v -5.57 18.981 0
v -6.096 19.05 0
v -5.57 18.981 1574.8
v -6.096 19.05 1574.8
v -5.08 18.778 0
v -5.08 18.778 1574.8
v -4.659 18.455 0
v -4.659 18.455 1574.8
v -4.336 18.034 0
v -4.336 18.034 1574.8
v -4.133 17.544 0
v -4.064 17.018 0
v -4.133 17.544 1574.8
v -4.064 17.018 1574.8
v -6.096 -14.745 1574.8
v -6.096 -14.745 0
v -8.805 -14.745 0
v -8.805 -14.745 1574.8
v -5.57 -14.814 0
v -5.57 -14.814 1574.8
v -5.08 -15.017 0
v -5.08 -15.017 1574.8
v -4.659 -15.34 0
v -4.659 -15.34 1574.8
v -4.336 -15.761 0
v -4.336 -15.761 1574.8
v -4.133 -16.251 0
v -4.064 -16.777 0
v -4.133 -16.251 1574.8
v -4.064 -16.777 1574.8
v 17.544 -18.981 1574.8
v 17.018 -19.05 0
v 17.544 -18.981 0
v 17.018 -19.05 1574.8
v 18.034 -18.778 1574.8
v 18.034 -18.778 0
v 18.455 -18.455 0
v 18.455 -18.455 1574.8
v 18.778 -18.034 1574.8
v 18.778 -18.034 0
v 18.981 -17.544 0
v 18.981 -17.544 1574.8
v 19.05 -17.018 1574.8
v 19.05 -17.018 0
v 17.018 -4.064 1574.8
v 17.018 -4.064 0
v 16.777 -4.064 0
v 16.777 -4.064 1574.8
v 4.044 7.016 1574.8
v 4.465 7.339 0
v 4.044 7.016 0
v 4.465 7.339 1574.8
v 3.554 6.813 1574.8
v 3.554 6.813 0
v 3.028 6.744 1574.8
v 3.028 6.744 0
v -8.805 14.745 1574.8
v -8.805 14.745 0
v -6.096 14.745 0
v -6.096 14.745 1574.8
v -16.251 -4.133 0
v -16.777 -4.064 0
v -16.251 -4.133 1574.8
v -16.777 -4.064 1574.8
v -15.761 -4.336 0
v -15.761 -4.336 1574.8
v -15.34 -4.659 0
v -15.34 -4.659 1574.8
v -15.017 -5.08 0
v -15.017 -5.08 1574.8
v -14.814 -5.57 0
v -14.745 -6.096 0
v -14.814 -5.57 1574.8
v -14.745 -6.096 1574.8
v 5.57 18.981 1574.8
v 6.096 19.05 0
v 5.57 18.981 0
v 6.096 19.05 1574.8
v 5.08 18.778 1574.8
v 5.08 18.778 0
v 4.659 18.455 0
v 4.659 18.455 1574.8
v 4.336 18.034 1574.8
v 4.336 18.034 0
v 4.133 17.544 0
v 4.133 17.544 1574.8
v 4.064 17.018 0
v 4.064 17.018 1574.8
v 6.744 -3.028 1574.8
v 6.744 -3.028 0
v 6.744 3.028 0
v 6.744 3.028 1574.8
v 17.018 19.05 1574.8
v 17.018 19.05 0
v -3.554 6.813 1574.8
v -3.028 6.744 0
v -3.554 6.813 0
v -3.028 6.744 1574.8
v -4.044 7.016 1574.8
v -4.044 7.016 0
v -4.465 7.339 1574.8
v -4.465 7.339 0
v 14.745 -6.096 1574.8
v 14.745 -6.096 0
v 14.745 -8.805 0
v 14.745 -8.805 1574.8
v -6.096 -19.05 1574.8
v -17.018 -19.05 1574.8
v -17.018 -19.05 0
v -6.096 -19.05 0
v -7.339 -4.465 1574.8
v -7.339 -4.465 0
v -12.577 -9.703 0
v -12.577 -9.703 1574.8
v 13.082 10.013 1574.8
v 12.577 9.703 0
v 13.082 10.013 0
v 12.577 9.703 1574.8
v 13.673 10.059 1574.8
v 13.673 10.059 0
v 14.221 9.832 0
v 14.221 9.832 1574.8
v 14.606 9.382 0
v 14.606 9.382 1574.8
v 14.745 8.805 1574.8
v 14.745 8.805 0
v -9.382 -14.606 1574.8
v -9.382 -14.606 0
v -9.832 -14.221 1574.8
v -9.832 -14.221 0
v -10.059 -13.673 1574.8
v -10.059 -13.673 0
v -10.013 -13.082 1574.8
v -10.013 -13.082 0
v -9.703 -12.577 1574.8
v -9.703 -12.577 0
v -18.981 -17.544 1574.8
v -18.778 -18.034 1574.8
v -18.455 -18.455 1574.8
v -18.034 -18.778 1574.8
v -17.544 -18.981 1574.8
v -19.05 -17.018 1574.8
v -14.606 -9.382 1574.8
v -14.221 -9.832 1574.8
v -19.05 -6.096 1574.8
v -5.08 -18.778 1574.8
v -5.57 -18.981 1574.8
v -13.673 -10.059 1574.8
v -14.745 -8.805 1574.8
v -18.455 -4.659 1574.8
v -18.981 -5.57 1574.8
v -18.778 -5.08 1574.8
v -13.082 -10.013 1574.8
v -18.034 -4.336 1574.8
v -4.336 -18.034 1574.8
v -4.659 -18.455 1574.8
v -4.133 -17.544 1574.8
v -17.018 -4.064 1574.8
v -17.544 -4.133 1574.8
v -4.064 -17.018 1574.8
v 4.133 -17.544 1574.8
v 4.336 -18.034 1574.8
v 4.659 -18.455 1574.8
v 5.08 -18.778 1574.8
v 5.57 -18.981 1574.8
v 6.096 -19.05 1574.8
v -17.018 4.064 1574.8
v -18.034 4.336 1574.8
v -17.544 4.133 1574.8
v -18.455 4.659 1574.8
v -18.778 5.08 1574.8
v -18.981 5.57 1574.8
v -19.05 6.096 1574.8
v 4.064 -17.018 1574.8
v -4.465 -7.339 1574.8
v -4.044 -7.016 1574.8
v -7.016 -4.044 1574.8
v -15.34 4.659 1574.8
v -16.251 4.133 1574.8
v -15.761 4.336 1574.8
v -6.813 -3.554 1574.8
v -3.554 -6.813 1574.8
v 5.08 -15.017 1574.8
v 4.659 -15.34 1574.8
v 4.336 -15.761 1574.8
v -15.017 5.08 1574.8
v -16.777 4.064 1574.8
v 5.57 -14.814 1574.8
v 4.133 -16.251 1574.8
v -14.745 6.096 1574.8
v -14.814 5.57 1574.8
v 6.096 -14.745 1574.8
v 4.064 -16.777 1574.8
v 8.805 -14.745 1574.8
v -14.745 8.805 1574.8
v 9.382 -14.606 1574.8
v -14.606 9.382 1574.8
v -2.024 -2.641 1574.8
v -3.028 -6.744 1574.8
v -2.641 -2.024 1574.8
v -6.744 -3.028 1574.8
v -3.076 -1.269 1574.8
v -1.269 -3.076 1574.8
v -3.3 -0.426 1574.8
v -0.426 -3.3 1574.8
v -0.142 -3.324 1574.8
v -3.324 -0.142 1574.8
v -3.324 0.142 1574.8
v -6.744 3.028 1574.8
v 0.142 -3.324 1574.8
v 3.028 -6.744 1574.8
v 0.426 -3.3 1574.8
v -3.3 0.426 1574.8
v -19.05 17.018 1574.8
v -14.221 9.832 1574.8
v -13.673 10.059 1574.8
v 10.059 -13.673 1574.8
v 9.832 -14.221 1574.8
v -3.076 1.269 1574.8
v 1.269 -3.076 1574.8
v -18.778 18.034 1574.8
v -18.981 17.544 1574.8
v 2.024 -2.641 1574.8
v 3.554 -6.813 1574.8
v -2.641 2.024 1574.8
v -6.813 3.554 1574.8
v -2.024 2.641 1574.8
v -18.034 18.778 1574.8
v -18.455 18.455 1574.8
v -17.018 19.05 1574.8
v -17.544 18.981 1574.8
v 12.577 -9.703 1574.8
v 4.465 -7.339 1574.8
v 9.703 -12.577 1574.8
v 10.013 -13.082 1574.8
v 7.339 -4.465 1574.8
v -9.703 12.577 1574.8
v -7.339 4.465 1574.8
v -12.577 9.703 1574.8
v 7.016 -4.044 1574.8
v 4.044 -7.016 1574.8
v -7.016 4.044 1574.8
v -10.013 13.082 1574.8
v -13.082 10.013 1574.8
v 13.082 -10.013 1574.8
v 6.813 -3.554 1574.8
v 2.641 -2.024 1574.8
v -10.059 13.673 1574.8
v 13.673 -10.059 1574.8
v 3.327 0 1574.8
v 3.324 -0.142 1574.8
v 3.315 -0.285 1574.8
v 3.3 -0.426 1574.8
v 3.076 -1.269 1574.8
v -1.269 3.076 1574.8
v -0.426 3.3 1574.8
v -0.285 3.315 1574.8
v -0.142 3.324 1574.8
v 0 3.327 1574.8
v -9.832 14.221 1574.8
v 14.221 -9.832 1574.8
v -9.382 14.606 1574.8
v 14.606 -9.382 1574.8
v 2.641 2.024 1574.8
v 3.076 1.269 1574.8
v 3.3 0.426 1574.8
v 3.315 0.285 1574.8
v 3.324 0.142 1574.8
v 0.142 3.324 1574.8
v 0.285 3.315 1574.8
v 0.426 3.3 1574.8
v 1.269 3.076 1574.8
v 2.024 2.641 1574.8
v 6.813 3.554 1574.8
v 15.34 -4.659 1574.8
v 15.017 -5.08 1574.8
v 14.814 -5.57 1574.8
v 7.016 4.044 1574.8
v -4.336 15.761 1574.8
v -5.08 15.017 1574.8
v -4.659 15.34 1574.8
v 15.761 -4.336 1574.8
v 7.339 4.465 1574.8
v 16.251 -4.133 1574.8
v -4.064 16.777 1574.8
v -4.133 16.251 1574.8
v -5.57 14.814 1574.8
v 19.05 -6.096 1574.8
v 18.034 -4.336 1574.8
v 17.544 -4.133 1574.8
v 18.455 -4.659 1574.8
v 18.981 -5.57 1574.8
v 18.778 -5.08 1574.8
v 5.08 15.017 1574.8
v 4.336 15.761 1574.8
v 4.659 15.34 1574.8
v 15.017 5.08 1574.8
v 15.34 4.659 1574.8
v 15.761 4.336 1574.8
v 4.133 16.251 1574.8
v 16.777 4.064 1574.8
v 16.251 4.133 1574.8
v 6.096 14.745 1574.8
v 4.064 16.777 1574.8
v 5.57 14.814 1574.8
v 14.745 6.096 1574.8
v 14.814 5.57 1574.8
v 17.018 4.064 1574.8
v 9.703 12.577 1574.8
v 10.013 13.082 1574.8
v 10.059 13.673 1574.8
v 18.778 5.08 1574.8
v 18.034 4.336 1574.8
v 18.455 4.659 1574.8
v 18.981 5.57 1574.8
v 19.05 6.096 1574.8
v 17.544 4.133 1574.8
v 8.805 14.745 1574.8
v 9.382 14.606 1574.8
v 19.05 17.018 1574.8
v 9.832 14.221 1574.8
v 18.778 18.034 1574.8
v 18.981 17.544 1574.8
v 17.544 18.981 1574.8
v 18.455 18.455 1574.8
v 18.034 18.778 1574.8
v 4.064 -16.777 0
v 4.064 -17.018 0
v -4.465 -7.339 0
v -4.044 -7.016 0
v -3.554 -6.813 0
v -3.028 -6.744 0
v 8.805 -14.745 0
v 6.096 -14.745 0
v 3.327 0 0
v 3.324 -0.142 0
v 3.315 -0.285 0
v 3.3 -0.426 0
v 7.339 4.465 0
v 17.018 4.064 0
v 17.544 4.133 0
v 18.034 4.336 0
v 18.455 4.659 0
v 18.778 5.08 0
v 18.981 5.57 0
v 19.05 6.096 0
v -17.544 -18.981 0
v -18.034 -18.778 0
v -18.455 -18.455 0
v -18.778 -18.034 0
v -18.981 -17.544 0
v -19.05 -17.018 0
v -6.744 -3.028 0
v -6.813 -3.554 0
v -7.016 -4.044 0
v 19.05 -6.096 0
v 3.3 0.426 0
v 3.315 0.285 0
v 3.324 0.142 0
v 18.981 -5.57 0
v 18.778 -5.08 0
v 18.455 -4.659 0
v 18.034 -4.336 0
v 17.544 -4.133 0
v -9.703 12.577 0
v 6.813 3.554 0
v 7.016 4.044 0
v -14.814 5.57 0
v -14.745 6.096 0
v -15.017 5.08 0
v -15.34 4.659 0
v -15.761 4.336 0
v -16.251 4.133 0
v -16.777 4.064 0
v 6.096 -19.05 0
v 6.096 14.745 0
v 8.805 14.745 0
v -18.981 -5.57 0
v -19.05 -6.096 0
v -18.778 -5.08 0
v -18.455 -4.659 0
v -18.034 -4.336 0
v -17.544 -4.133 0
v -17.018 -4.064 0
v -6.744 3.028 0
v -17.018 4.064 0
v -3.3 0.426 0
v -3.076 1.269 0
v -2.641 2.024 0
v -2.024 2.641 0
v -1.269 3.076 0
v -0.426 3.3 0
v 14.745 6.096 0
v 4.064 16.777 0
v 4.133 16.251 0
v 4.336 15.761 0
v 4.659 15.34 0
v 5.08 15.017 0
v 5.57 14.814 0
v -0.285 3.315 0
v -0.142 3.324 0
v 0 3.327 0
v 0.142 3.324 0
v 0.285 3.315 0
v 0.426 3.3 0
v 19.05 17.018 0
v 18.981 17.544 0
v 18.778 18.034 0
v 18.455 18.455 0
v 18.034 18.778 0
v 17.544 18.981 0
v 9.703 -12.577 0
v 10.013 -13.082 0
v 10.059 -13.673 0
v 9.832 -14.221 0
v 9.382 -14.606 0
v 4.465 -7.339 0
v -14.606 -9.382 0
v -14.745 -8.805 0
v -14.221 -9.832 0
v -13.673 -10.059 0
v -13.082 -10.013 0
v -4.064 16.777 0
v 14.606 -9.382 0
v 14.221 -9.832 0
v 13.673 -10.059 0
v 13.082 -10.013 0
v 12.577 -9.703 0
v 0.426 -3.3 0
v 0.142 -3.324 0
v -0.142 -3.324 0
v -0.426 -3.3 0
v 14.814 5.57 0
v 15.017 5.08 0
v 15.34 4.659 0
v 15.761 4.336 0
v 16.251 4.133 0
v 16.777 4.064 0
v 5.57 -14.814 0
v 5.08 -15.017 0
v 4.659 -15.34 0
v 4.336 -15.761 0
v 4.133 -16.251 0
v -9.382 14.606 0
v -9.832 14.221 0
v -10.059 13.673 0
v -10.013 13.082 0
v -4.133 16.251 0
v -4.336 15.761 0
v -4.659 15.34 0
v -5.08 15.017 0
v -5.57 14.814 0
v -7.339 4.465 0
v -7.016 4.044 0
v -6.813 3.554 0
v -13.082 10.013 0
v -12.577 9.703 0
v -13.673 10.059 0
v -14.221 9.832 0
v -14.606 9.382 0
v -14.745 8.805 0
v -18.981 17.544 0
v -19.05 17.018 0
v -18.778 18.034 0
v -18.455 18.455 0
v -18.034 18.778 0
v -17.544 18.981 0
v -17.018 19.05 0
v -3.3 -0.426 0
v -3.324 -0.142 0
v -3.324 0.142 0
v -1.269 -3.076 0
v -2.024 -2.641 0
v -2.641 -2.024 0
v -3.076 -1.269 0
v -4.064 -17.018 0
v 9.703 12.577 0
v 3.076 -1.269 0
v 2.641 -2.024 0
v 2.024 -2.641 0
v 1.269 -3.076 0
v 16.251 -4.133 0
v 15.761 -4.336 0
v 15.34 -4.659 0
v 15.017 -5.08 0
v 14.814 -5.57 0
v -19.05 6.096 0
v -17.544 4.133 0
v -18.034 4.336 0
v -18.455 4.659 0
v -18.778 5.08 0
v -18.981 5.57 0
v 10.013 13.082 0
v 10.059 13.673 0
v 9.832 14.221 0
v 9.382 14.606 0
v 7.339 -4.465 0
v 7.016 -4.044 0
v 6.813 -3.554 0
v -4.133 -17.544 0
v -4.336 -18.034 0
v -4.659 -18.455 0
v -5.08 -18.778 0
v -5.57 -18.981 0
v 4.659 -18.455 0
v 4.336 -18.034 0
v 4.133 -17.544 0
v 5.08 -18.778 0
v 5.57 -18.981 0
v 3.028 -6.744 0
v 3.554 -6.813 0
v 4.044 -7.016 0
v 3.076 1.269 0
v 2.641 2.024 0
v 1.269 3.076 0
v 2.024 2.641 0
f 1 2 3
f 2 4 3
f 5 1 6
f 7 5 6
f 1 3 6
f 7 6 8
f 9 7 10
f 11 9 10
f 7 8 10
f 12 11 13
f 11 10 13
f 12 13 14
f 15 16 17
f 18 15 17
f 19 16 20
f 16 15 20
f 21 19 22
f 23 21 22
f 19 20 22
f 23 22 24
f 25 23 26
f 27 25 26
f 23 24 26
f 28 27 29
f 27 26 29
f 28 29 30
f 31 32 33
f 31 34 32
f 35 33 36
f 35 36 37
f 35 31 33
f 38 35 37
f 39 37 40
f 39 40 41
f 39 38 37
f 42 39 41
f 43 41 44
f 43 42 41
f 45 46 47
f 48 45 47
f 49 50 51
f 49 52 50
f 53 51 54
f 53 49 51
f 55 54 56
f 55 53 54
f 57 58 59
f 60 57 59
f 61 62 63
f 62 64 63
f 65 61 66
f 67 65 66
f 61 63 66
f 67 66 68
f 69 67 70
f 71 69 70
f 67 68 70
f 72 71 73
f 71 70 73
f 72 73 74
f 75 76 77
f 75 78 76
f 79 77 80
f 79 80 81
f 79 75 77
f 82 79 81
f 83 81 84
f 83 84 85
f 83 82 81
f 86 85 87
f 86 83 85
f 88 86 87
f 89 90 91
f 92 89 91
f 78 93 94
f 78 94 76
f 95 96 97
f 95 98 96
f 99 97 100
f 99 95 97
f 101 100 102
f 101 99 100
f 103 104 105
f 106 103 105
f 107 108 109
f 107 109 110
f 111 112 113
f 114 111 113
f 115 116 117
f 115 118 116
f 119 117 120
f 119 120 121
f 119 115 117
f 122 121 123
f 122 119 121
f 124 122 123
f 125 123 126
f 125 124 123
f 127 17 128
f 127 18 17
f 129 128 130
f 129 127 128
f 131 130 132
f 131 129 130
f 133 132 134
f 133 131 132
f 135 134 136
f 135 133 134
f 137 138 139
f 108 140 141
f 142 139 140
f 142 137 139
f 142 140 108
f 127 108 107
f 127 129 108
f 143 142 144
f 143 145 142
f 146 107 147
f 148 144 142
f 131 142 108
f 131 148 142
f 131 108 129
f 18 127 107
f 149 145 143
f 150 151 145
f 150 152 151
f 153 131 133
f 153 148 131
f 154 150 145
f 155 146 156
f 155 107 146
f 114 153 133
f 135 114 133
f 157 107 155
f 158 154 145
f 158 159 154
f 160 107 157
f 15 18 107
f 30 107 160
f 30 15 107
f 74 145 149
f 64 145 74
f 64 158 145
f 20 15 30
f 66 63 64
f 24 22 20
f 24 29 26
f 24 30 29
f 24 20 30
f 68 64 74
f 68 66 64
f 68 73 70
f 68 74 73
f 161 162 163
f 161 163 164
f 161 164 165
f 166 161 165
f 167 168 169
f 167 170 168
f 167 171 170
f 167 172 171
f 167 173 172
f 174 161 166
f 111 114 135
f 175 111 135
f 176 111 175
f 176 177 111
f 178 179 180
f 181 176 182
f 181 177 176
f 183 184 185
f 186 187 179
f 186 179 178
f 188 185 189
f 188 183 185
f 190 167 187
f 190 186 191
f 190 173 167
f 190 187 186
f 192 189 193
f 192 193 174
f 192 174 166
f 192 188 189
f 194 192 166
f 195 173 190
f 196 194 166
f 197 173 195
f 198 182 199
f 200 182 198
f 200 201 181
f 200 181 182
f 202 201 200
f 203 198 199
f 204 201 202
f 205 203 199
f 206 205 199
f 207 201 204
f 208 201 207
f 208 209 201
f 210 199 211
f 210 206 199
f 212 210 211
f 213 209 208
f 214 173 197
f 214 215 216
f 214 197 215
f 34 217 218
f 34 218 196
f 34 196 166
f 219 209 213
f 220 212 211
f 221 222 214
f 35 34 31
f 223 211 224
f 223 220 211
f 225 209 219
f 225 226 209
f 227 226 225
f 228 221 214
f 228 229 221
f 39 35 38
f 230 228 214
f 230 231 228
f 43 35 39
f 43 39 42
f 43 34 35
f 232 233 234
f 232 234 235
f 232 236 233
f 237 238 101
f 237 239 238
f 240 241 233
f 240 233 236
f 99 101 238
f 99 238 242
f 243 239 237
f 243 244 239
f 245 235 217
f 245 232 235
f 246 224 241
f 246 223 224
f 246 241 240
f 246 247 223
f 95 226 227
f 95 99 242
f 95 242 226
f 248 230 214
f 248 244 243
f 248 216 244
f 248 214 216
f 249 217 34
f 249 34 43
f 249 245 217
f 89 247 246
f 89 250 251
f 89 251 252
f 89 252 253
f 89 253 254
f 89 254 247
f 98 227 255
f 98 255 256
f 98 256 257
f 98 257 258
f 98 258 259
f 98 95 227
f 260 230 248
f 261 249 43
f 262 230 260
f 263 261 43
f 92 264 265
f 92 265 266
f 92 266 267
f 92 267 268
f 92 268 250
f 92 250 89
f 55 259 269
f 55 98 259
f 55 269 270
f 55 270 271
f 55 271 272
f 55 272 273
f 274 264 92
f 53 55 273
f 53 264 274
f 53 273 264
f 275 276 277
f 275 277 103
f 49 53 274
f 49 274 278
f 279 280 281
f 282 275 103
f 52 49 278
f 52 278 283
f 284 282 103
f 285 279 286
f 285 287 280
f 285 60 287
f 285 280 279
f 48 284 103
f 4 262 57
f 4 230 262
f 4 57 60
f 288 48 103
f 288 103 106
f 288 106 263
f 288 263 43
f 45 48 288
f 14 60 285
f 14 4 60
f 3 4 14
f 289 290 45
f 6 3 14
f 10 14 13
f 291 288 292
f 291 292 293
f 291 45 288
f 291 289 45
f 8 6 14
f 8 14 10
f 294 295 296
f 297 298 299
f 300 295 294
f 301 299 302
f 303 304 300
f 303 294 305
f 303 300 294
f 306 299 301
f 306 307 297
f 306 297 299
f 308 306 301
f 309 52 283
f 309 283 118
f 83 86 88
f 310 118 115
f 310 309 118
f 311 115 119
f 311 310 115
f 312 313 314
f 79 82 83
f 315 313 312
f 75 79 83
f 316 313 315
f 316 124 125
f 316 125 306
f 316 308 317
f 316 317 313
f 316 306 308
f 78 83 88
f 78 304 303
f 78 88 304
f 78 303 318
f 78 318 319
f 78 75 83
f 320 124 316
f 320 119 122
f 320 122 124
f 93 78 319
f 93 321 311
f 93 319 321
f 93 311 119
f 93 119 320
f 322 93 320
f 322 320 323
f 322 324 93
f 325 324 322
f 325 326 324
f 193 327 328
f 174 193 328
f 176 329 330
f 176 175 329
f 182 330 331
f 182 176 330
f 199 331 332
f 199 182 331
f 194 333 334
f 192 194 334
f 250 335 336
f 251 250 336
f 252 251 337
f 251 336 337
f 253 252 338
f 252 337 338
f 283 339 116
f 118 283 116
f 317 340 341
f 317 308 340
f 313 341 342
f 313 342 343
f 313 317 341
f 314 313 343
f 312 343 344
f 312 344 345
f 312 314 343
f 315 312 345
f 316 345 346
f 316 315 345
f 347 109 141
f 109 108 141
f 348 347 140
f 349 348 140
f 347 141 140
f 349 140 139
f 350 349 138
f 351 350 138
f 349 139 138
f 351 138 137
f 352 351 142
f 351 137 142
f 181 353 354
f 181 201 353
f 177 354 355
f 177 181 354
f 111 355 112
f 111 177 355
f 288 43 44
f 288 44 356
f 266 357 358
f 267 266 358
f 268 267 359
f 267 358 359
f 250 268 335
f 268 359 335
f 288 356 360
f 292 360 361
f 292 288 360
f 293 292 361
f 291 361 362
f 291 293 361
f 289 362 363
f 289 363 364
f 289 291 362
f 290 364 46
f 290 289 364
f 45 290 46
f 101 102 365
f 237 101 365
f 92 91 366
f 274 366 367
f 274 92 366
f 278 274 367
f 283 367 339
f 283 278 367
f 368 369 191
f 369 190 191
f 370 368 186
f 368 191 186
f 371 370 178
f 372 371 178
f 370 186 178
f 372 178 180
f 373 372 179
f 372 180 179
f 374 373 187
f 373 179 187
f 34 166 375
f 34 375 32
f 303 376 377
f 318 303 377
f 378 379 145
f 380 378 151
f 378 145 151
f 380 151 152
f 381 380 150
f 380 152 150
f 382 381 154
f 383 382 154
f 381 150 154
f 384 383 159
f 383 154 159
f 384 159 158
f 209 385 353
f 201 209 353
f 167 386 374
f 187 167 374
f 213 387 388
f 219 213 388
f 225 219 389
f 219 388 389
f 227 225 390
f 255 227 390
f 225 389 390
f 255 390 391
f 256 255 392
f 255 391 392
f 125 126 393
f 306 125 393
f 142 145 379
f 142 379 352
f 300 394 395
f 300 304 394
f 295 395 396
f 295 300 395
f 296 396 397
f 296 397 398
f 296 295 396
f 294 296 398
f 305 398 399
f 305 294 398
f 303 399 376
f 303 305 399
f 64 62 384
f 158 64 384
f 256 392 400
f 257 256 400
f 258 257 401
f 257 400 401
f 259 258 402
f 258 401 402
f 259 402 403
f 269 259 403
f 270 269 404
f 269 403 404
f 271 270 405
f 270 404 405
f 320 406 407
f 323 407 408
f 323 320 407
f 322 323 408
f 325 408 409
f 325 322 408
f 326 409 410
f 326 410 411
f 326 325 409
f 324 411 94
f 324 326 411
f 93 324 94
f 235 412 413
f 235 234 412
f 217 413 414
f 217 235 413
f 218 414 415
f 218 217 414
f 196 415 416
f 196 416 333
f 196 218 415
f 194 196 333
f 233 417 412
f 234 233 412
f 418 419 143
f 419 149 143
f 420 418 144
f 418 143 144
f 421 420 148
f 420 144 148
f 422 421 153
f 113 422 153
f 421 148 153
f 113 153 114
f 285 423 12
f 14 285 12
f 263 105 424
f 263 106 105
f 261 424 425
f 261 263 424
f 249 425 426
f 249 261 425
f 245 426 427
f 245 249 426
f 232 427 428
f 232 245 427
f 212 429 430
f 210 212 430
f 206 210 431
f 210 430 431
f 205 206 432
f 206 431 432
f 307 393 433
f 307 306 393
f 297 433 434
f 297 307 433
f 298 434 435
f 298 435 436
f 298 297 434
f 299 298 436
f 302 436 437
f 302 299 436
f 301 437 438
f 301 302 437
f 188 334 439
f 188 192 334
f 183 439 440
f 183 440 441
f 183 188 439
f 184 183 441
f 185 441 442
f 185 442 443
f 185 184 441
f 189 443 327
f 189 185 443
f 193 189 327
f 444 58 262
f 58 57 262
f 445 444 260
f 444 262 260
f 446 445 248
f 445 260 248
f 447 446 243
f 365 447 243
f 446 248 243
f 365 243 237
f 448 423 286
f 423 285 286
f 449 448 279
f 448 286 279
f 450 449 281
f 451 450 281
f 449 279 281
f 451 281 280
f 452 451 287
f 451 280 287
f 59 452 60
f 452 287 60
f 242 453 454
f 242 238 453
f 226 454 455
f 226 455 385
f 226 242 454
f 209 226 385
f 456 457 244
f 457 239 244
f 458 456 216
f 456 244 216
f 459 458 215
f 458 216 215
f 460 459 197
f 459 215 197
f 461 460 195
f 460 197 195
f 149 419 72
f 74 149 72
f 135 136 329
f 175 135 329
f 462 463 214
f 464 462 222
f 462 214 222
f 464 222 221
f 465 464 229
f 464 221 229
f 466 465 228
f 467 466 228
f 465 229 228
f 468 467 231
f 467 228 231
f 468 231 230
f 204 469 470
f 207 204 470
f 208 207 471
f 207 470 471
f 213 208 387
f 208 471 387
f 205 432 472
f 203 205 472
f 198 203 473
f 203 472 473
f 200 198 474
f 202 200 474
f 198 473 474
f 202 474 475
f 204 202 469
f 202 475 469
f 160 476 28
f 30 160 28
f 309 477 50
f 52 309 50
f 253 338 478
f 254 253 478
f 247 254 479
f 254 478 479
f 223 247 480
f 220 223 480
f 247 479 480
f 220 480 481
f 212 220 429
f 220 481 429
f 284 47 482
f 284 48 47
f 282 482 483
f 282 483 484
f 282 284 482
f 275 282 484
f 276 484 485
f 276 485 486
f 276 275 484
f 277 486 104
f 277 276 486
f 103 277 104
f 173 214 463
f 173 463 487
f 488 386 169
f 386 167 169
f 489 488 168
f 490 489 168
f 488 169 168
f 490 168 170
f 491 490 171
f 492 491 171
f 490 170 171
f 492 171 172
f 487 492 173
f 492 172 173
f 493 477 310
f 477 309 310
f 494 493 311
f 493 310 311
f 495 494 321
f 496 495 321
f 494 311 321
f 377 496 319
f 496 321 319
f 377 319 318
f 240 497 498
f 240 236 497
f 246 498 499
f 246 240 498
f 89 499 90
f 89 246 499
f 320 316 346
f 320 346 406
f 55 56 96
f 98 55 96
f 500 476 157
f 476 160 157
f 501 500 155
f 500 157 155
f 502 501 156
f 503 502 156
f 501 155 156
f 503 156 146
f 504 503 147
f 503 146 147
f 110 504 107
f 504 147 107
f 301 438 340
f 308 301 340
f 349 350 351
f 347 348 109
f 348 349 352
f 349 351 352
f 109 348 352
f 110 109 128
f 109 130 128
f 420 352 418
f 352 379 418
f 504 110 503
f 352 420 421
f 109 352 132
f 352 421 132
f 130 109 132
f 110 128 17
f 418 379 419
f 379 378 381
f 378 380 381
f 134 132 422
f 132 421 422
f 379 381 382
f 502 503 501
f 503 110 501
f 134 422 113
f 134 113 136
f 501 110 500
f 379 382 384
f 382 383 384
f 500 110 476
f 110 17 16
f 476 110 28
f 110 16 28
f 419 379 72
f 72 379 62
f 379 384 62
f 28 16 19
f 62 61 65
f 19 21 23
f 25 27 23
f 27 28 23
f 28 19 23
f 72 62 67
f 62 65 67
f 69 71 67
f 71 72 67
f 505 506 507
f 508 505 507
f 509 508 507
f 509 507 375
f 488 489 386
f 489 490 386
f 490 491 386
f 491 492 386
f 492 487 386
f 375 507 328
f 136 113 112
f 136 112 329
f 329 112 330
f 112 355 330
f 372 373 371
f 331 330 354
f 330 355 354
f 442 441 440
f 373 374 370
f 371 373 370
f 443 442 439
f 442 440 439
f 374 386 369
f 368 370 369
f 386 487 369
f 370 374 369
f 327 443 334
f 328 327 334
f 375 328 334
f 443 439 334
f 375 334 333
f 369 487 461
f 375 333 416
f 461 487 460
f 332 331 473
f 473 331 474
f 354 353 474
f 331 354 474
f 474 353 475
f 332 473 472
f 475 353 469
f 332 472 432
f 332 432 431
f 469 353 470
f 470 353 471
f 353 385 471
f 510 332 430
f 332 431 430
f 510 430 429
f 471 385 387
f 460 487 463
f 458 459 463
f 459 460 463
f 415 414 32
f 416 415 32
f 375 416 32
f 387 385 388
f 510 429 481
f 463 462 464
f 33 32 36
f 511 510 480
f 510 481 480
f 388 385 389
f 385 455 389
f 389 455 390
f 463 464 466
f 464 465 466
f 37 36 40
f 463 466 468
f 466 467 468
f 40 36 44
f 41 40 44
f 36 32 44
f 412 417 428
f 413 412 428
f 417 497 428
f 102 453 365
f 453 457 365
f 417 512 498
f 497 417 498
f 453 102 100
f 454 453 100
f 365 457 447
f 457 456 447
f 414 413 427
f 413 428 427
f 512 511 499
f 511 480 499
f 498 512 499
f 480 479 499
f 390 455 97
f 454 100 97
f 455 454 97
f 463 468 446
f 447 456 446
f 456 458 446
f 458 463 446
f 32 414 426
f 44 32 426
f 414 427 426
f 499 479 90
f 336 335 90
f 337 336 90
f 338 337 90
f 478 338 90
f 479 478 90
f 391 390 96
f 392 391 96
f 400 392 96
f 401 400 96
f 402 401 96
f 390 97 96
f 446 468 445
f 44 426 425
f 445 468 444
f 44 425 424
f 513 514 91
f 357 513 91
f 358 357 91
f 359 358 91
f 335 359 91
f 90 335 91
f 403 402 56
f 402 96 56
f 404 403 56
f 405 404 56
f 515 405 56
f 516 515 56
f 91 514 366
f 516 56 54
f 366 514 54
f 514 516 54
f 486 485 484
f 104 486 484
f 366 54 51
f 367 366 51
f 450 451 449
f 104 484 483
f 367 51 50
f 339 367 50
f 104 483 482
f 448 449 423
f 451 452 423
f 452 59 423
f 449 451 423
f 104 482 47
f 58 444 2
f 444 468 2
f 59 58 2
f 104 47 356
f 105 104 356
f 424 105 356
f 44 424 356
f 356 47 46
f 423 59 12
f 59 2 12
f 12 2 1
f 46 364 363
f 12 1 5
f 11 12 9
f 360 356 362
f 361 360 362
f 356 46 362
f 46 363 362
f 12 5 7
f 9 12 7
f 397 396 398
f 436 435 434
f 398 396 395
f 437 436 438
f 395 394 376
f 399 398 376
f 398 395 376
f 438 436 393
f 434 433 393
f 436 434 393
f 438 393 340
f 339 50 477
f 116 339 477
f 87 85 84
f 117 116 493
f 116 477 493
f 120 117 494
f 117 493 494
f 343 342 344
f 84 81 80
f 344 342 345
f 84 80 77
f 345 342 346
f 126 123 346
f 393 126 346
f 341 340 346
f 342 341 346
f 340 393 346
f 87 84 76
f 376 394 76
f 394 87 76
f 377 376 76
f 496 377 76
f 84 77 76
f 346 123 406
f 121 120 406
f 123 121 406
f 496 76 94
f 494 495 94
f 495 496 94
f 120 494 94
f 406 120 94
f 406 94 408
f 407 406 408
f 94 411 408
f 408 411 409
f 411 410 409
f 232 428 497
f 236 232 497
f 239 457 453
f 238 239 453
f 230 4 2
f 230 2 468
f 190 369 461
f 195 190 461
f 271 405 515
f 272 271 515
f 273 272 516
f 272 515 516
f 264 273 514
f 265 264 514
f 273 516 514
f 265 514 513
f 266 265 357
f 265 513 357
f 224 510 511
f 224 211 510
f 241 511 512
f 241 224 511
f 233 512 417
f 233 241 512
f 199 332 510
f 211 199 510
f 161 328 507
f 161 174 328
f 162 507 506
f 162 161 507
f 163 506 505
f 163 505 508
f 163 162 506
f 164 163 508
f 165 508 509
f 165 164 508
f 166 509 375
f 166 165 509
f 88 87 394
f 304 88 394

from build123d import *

# Parameters (mm, degrees)
SKETCH1_W           = 2.6797
SKETCH1_H           = 2.6797
BOSS_EXTRUDE1_DEPTH = 1574.8
FILLET2_R           = 2.032
FILLET3_R           = 2.032
FILLET4_R           = 1.27


with BuildPart() as part:
    # Sketch1 → Boss-Extrude1 (new body)
    with BuildSketch(Plane.XY):
        Polygon((-19.05, 16.176318041), (-19.05, 14.7447), (-17.618381959, 14.7447), align=None)
        Polygon((-14.7447, 17.618381959), (-14.7447, 19.05), (-16.176318041, 19.05), align=None)
        Polygon((14.7447, 19.05), (14.7447, 17.618381959), (16.176318041, 19.05), align=None)
        Polygon((17.618381959, 14.7447), (19.05, 14.7447), (19.05, 16.176318041), align=None)
        Polygon((19.05, -14.7447), (17.618381959, -14.7447), (19.05, -16.176318041), align=None)
        Polygon((16.176318041, -19.05), (14.7447, -17.618381959), (14.7447, -19.05), align=None)
        Polygon((19.05, -16.176318041), (17.618381959, -14.7447), (14.7447, -14.7447), (14.7447, -17.618381959), (16.176318041, -19.05), (19.05, -19.05), align=None)
        Polygon((19.05, -4.064), (14.7447, -4.064), (14.7447, -11.871018041), (17.618381959, -14.7447), (19.05, -14.7447), align=None)
        Polygon((17.618381959, -14.7447), (14.7447, -11.871018041), (14.7447, -14.7447), align=None)
        Polygon((14.7447, -14.7447), (11.871018041, -14.7447), (14.7447, -17.618381959), align=None)
        Polygon((11.871018041, -14.7447), (4.064, -14.7447), (4.064, -19.05), (14.7447, -19.05), (14.7447, -17.618381959), align=None)
        Polygon((14.7447, 6.7437), (14.7447, 4.064), (19.05, 4.064), (19.05, 14.7447), (17.618381959, 14.7447), (14.7447, 11.871018041), align=None)
        Polygon((14.7447, 14.7447), (14.7447, 11.871018041), (17.618381959, 14.7447), align=None)
        Polygon((16.176318041, 19.05), (14.7447, 17.618381959), (14.7447, 14.7447), (17.618381959, 14.7447), (19.05, 16.176318041), (19.05, 19.05), align=None)
        Polygon((4.064, 19.05), (4.064, 14.7447), (11.871018041, 14.7447), (14.7447, 17.618381959), (14.7447, 19.05), align=None)
        Polygon((14.7447, 17.618381959), (11.871018041, 14.7447), (14.7447, 14.7447), align=None)
        Polygon((-6.7437, 14.7447), (-4.064, 14.7447), (-4.064, 19.05), (-14.7447, 19.05), (-14.7447, 17.618381959), (-11.871018041, 14.7447), align=None)
        Polygon((-14.7447, 14.7447), (-11.871018041, 14.7447), (-14.7447, 17.618381959), align=None)
        Polygon((-14.7447, 14.7447), (-14.7447, 17.618381959), (-16.176318041, 19.05), (-19.05, 19.05), (-19.05, 16.176318041), (-17.618381959, 14.7447), align=None)
        Polygon((-17.618381959, 14.7447), (-14.7447, 11.871018041), (-14.7447, 14.7447), align=None)
        Polygon((-19.05, 4.064), (-14.7447, 4.064), (-14.7447, 6.7437), (-14.7447, 11.871018041), (-17.618381959, 14.7447), (-19.05, 14.7447), align=None)
        Polygon((-14.7447, -11.871018041), (-14.7447, -4.064), (-19.05, -4.064), (-19.05, -14.7447), (-17.618381959, -14.7447), align=None)
        Polygon((-14.7447, -14.7447), (-14.7447, -11.871018041), (-17.618381959, -14.7447), align=None)
        Polygon((-19.05, -16.176318041), (-17.618381959, -14.7447), (-19.05, -14.7447), align=None)
        Polygon((-14.7447, -14.7447), (-17.618381959, -14.7447), (-19.05, -16.176318041), (-19.05, -19.05), (-16.176318041, -19.05), (-14.7447, -17.618381959), align=None)
        Polygon((-16.176318041, -19.05), (-14.7447, -19.05), (-14.7447, -17.618381959), align=None)
        Polygon((-14.7447, -17.618381959), (-11.871018041, -14.7447), (-14.7447, -14.7447), align=None)
        Polygon((-4.064, -19.05), (-4.064, -14.7447), (-6.7437, -14.7447), (-11.871018041, -14.7447), (-14.7447, -17.618381959), (-14.7447, -19.05), align=None)
        Polygon((-6.7437, -6.7437), (-6.7437, -4.064), (-6.937681959, -4.064), (-14.7447, -11.871018041), (-14.7447, -14.7447), (-11.871018041, -14.7447), (-6.7437, -9.617381959), align=None)
        Polygon((-4.064, -6.937681959), (-4.064, -6.7437), (-6.7437, -6.7437), (-6.7437, -9.617381959), align=None)
        with Locations((-5.40385, -5.40385)):
            Rectangle(SKETCH1_W, SKETCH1_H)
        Polygon((6.7437, -6.7437), (4.064, -6.7437), (4.064, -6.937681959), (11.871018041, -14.7447), (14.7447, -14.7447), (14.7447, -11.871018041), (6.937681959, -4.064), (6.7437, -4.064), align=None)
        Polygon((4.064, 6.937681959), (4.064, 6.7437), (6.7437, 6.7437), (9.617381959, 6.7437), (14.7447, 11.871018041), (14.7447, 14.7447), (11.871018041, 14.7447), align=None)
        Polygon((6.7437, 6.7437), (6.7437, 4.064), (6.937681959, 4.064), (9.617381959, 6.7437), align=None)
        Polygon((-9.617381959, 6.7437), (-6.7437, 6.7437), (-6.7437, 9.617381959), (-11.871018041, 14.7447), (-14.7447, 14.7447), (-14.7447, 11.871018041), align=None)
        Polygon((-6.7437, 6.7437), (-4.064, 6.7437), (-4.064, 6.937681959), (-6.7437, 9.617381959), align=None)
        Polygon((-6.937681959, 4.064), (-6.7437, 4.064), (-6.7437, 6.7437), (-9.617381959, 6.7437), align=None)
        with Locations((-5.40385, 5.40385)):
            Rectangle(SKETCH1_W, SKETCH1_H)
        Polygon((-6.7437, 3.870018041), (-4.064, 1.190318041), (-4.064, 4.064), (-6.7437, 4.064), align=None)
        Polygon((-4.064, -1.190318041), (-4.064, 1.190318041), (-6.7437, 3.870018041), (-6.7437, -3.870018041), align=None)
        with BuildLine():
            ThreePointArc((-3.299979026, 0.426297067), (-2.352827104, 2.352827104), (-0.426297067, 3.299979026))
            Line((-0.426297067, 3.299979026), (-1.190318041, 4.064))
            Line((-1.190318041, 4.064), (-4.064, 4.064))
            Line((-4.064, 4.064), (-4.064, 1.190318041))
            Line((-4.064, 1.190318041), (-3.299979026, 0.426297067))
        make_face()
        Polygon((-4.064, 4.064), (-1.190318041, 4.064), (-3.870018041, 6.7437), (-4.064, 6.7437), align=None)
        Polygon((-1.190318041, 4.064), (0, 4.064), (0, 6.7437), (-3.870018041, 6.7437), align=None)
        with BuildLine():
            ThreePointArc((-0.426297067, 3.299979026), (-0.213589032, 3.32053768), (0, 3.3274))
            Line((0, 3.3274), (0, 4.064))
            Line((0, 4.064), (-1.190318041, 4.064))
            Line((-1.190318041, 4.064), (-0.426297067, 3.299979026))
        make_face()
        with BuildLine():
            Line((0, 4.064), (0, 3.3274))
            ThreePointArc((0, 3.3274), (0.213589032, 3.32053768), (0.426297067, 3.299979026))
            Line((0.426297067, 3.299979026), (1.190318041, 4.064))
            Line((1.190318041, 4.064), (0, 4.064))
        make_face()
        Polygon((0, 6.7437), (0, 4.064), (1.190318041, 4.064), (3.870018041, 6.7437), align=None)
        Polygon((3.870018041, 6.7437), (1.190318041, 4.064), (4.064, 4.064), (4.064, 6.7437), align=None)
        with Locations((5.40385, 5.40385)):
            Rectangle(SKETCH1_W, SKETCH1_H)
        Polygon((4.064, 4.064), (4.064, 1.190318041), (6.7437, 3.870018041), (6.7437, 4.064), align=None)
        Polygon((4.064, 1.190318041), (4.064, 0), (6.7437, 0), (6.7437, 3.870018041), align=None)
        with BuildLine():
            ThreePointArc((0.426297067, 3.299979026), (2.352827104, 2.352827104), (3.299979026, 0.426297067))
            Line((3.299979026, 0.426297067), (4.064, 1.190318041))
            Line((4.064, 1.190318041), (4.064, 4.064))
            Line((4.064, 4.064), (1.190318041, 4.064))
            Line((1.190318041, 4.064), (0.426297067, 3.299979026))
        make_face()
        with BuildLine():
            ThreePointArc((3.299979026, 0.426297067), (3.32053768, 0.213589032), (3.3274, 0))
            Line((3.3274, 0), (4.064, 0))
            Line((4.064, 0), (4.064, 1.190318041))
            Line((4.064, 1.190318041), (3.299979026, 0.426297067))
        make_face()
        with BuildLine():
            Line((4.064, 0), (3.3274, 0))
            ThreePointArc((3.3274, 0), (3.32053768, -0.213589032), (3.299979026, -0.426297067))
            Line((3.299979026, -0.426297067), (4.064, -1.190318041))
            Line((4.064, -1.190318041), (4.064, 0))
        make_face()
        Polygon((6.7437, 0), (4.064, 0), (4.064, -1.190318041), (6.7437, -3.870018041), align=None)
        Polygon((6.7437, -3.870018041), (4.064, -1.190318041), (4.064, -4.064), (6.7437, -4.064), align=None)
        with BuildLine():
            Line((4.064, -1.190318041), (3.299979026, -0.426297067))
            ThreePointArc((3.299979026, -0.426297067), (2.352827104, -2.352827104), (0.426297067, -3.299979026))
            Line((0.426297067, -3.299979026), (1.190318041, -4.064))
            Line((1.190318041, -4.064), (4.064, -4.064))
            Line((4.064, -4.064), (4.064, -1.190318041))
        make_face()
        with Locations((5.40385, -5.40385)):
            Rectangle(SKETCH1_W, SKETCH1_H)
        Polygon((4.064, -6.7437), (4.064, -4.064), (1.190318041, -4.064), (3.870018041, -6.7437), align=None)
        Polygon((3.870018041, -6.7437), (1.190318041, -4.064), (-1.190318041, -4.064), (-3.870018041, -6.7437), align=None)
        with BuildLine():
            Line((1.190318041, -4.064), (0.426297067, -3.299979026))
            ThreePointArc((0.426297067, -3.299979026), (0, -3.3274), (-0.426297067, -3.299979026))
            Line((-0.426297067, -3.299979026), (-1.190318041, -4.064))
            Line((-1.190318041, -4.064), (1.190318041, -4.064))
        make_face()
        with BuildLine():
            Line((-1.190318041, -4.064), (-0.426297067, -3.299979026))
            ThreePointArc((-0.426297067, -3.299979026), (-2.352827104, -2.352827104), (-3.299979026, -0.426297067))
            Line((-3.299979026, -0.426297067), (-4.064, -1.190318041))
            Line((-4.064, -1.190318041), (-4.064, -4.064))
            Line((-4.064, -4.064), (-1.190318041, -4.064))
        make_face()
        Polygon((-4.064, -4.064), (-4.064, -1.190318041), (-6.7437, -3.870018041), (-6.7437, -4.064), align=None)
        with BuildLine():
            ThreePointArc((-3.299979026, -0.426297067), (-3.3274, 0), (-3.299979026, 0.426297067))
            Line((-3.299979026, 0.426297067), (-4.064, 1.190318041))
            Line((-4.064, 1.190318041), (-4.064, -1.190318041))
            Line((-4.064, -1.190318041), (-3.299979026, -0.426297067))
        make_face()
        Polygon((4.064, -6.937681959), (4.064, -6.7437), (3.870018041, -6.7437), align=None)
        Polygon((6.937681959, -4.064), (6.7437, -3.870018041), (6.7437, -4.064), align=None)
        Polygon((6.7437, 4.064), (6.7437, 3.870018041), (6.937681959, 4.064), align=None)
        Polygon((4.064, 6.937681959), (3.870018041, 6.7437), (4.064, 6.7437), align=None)
        Polygon((-4.064, 6.7437), (-3.870018041, 6.7437), (-4.064, 6.937681959), align=None)
        Polygon((-6.937681959, 4.064), (-6.7437, 3.870018041), (-6.7437, 4.064), align=None)
        Polygon((-6.7437, -4.064), (-6.7437, -3.870018041), (-6.937681959, -4.064), align=None)
        Polygon((-4.064, -6.937681959), (-3.870018041, -6.7437), (-4.064, -6.7437), align=None)
        Polygon((-3.870018041, -6.7437), (-1.190318041, -4.064), (-4.064, -4.064), (-4.064, -6.7437), align=None)
    extrude(amount=BOSS_EXTRUDE1_DEPTH)

    # Fillet2
    fillet2_edges = [part.edges().sort_by_distance(p)[0] for p in [
        (6.7437, 3.870018041, 787.4),
        (6.7437, -3.870018041, 787.4),
        (3.870018041, -6.7437, 787.4),
        (-3.870018041, -6.7437, 787.4),
        (-6.7437, -3.870018041, 787.4),
        (-6.7437, 3.870018041, 787.4),
        (-3.870018041, 6.7437, 787.4),
        (3.870018041, 6.7437, 787.4),
    ]]
    fillet(fillet2_edges, radius=FILLET2_R)

    # Fillet3
    fillet3_edges = [part.edges().sort_by_distance(p)[0] for p in [
        (14.7447, 4.064, 787.4),
        (14.7447, -4.064, 787.4),
        (19.05, -4.064, 787.4),
        (19.05, -19.05, 787.4),
        (4.064, -19.05, 787.4),
        (4.064, -14.7447, 787.4),
        (-4.064, -14.7447, 787.4),
        (-4.064, -19.05, 787.4),
        (-19.05, -19.05, 787.4),
        (-19.05, -4.064, 787.4),
        (-14.7447, -4.064, 787.4),
        (-14.7447, 4.064, 787.4),
        (-19.05, 4.064, 787.4),
        (-19.05, 19.05, 787.4),
        (-4.064, 19.05, 787.4),
        (-4.064, 14.7447, 787.4),
        (4.064, 14.7447, 787.4),
        (4.064, 19.05, 787.4),
        (19.05, 19.05, 787.4),
        (19.05, 4.064, 787.4),
    ]]
    fillet(fillet3_edges, radius=FILLET3_R)

    # Fillet4
    fillet4_edges = [part.edges().sort_by_distance(p)[0] for p in [
        (14.7447, 11.871018041, 787.4),
        (14.7447, -11.871018041, 787.4),
        (11.871018041, -14.7447, 787.4),
        (-11.871018041, -14.7447, 787.4),
        (-14.7447, -11.871018041, 787.4),
        (-14.7447, 11.871018041, 787.4),
        (-11.871018041, 14.7447, 787.4),
        (11.871018041, 14.7447, 787.4),
    ]]
    fillet(fillet4_edges, radius=FILLET4_R)


solid = part.part
